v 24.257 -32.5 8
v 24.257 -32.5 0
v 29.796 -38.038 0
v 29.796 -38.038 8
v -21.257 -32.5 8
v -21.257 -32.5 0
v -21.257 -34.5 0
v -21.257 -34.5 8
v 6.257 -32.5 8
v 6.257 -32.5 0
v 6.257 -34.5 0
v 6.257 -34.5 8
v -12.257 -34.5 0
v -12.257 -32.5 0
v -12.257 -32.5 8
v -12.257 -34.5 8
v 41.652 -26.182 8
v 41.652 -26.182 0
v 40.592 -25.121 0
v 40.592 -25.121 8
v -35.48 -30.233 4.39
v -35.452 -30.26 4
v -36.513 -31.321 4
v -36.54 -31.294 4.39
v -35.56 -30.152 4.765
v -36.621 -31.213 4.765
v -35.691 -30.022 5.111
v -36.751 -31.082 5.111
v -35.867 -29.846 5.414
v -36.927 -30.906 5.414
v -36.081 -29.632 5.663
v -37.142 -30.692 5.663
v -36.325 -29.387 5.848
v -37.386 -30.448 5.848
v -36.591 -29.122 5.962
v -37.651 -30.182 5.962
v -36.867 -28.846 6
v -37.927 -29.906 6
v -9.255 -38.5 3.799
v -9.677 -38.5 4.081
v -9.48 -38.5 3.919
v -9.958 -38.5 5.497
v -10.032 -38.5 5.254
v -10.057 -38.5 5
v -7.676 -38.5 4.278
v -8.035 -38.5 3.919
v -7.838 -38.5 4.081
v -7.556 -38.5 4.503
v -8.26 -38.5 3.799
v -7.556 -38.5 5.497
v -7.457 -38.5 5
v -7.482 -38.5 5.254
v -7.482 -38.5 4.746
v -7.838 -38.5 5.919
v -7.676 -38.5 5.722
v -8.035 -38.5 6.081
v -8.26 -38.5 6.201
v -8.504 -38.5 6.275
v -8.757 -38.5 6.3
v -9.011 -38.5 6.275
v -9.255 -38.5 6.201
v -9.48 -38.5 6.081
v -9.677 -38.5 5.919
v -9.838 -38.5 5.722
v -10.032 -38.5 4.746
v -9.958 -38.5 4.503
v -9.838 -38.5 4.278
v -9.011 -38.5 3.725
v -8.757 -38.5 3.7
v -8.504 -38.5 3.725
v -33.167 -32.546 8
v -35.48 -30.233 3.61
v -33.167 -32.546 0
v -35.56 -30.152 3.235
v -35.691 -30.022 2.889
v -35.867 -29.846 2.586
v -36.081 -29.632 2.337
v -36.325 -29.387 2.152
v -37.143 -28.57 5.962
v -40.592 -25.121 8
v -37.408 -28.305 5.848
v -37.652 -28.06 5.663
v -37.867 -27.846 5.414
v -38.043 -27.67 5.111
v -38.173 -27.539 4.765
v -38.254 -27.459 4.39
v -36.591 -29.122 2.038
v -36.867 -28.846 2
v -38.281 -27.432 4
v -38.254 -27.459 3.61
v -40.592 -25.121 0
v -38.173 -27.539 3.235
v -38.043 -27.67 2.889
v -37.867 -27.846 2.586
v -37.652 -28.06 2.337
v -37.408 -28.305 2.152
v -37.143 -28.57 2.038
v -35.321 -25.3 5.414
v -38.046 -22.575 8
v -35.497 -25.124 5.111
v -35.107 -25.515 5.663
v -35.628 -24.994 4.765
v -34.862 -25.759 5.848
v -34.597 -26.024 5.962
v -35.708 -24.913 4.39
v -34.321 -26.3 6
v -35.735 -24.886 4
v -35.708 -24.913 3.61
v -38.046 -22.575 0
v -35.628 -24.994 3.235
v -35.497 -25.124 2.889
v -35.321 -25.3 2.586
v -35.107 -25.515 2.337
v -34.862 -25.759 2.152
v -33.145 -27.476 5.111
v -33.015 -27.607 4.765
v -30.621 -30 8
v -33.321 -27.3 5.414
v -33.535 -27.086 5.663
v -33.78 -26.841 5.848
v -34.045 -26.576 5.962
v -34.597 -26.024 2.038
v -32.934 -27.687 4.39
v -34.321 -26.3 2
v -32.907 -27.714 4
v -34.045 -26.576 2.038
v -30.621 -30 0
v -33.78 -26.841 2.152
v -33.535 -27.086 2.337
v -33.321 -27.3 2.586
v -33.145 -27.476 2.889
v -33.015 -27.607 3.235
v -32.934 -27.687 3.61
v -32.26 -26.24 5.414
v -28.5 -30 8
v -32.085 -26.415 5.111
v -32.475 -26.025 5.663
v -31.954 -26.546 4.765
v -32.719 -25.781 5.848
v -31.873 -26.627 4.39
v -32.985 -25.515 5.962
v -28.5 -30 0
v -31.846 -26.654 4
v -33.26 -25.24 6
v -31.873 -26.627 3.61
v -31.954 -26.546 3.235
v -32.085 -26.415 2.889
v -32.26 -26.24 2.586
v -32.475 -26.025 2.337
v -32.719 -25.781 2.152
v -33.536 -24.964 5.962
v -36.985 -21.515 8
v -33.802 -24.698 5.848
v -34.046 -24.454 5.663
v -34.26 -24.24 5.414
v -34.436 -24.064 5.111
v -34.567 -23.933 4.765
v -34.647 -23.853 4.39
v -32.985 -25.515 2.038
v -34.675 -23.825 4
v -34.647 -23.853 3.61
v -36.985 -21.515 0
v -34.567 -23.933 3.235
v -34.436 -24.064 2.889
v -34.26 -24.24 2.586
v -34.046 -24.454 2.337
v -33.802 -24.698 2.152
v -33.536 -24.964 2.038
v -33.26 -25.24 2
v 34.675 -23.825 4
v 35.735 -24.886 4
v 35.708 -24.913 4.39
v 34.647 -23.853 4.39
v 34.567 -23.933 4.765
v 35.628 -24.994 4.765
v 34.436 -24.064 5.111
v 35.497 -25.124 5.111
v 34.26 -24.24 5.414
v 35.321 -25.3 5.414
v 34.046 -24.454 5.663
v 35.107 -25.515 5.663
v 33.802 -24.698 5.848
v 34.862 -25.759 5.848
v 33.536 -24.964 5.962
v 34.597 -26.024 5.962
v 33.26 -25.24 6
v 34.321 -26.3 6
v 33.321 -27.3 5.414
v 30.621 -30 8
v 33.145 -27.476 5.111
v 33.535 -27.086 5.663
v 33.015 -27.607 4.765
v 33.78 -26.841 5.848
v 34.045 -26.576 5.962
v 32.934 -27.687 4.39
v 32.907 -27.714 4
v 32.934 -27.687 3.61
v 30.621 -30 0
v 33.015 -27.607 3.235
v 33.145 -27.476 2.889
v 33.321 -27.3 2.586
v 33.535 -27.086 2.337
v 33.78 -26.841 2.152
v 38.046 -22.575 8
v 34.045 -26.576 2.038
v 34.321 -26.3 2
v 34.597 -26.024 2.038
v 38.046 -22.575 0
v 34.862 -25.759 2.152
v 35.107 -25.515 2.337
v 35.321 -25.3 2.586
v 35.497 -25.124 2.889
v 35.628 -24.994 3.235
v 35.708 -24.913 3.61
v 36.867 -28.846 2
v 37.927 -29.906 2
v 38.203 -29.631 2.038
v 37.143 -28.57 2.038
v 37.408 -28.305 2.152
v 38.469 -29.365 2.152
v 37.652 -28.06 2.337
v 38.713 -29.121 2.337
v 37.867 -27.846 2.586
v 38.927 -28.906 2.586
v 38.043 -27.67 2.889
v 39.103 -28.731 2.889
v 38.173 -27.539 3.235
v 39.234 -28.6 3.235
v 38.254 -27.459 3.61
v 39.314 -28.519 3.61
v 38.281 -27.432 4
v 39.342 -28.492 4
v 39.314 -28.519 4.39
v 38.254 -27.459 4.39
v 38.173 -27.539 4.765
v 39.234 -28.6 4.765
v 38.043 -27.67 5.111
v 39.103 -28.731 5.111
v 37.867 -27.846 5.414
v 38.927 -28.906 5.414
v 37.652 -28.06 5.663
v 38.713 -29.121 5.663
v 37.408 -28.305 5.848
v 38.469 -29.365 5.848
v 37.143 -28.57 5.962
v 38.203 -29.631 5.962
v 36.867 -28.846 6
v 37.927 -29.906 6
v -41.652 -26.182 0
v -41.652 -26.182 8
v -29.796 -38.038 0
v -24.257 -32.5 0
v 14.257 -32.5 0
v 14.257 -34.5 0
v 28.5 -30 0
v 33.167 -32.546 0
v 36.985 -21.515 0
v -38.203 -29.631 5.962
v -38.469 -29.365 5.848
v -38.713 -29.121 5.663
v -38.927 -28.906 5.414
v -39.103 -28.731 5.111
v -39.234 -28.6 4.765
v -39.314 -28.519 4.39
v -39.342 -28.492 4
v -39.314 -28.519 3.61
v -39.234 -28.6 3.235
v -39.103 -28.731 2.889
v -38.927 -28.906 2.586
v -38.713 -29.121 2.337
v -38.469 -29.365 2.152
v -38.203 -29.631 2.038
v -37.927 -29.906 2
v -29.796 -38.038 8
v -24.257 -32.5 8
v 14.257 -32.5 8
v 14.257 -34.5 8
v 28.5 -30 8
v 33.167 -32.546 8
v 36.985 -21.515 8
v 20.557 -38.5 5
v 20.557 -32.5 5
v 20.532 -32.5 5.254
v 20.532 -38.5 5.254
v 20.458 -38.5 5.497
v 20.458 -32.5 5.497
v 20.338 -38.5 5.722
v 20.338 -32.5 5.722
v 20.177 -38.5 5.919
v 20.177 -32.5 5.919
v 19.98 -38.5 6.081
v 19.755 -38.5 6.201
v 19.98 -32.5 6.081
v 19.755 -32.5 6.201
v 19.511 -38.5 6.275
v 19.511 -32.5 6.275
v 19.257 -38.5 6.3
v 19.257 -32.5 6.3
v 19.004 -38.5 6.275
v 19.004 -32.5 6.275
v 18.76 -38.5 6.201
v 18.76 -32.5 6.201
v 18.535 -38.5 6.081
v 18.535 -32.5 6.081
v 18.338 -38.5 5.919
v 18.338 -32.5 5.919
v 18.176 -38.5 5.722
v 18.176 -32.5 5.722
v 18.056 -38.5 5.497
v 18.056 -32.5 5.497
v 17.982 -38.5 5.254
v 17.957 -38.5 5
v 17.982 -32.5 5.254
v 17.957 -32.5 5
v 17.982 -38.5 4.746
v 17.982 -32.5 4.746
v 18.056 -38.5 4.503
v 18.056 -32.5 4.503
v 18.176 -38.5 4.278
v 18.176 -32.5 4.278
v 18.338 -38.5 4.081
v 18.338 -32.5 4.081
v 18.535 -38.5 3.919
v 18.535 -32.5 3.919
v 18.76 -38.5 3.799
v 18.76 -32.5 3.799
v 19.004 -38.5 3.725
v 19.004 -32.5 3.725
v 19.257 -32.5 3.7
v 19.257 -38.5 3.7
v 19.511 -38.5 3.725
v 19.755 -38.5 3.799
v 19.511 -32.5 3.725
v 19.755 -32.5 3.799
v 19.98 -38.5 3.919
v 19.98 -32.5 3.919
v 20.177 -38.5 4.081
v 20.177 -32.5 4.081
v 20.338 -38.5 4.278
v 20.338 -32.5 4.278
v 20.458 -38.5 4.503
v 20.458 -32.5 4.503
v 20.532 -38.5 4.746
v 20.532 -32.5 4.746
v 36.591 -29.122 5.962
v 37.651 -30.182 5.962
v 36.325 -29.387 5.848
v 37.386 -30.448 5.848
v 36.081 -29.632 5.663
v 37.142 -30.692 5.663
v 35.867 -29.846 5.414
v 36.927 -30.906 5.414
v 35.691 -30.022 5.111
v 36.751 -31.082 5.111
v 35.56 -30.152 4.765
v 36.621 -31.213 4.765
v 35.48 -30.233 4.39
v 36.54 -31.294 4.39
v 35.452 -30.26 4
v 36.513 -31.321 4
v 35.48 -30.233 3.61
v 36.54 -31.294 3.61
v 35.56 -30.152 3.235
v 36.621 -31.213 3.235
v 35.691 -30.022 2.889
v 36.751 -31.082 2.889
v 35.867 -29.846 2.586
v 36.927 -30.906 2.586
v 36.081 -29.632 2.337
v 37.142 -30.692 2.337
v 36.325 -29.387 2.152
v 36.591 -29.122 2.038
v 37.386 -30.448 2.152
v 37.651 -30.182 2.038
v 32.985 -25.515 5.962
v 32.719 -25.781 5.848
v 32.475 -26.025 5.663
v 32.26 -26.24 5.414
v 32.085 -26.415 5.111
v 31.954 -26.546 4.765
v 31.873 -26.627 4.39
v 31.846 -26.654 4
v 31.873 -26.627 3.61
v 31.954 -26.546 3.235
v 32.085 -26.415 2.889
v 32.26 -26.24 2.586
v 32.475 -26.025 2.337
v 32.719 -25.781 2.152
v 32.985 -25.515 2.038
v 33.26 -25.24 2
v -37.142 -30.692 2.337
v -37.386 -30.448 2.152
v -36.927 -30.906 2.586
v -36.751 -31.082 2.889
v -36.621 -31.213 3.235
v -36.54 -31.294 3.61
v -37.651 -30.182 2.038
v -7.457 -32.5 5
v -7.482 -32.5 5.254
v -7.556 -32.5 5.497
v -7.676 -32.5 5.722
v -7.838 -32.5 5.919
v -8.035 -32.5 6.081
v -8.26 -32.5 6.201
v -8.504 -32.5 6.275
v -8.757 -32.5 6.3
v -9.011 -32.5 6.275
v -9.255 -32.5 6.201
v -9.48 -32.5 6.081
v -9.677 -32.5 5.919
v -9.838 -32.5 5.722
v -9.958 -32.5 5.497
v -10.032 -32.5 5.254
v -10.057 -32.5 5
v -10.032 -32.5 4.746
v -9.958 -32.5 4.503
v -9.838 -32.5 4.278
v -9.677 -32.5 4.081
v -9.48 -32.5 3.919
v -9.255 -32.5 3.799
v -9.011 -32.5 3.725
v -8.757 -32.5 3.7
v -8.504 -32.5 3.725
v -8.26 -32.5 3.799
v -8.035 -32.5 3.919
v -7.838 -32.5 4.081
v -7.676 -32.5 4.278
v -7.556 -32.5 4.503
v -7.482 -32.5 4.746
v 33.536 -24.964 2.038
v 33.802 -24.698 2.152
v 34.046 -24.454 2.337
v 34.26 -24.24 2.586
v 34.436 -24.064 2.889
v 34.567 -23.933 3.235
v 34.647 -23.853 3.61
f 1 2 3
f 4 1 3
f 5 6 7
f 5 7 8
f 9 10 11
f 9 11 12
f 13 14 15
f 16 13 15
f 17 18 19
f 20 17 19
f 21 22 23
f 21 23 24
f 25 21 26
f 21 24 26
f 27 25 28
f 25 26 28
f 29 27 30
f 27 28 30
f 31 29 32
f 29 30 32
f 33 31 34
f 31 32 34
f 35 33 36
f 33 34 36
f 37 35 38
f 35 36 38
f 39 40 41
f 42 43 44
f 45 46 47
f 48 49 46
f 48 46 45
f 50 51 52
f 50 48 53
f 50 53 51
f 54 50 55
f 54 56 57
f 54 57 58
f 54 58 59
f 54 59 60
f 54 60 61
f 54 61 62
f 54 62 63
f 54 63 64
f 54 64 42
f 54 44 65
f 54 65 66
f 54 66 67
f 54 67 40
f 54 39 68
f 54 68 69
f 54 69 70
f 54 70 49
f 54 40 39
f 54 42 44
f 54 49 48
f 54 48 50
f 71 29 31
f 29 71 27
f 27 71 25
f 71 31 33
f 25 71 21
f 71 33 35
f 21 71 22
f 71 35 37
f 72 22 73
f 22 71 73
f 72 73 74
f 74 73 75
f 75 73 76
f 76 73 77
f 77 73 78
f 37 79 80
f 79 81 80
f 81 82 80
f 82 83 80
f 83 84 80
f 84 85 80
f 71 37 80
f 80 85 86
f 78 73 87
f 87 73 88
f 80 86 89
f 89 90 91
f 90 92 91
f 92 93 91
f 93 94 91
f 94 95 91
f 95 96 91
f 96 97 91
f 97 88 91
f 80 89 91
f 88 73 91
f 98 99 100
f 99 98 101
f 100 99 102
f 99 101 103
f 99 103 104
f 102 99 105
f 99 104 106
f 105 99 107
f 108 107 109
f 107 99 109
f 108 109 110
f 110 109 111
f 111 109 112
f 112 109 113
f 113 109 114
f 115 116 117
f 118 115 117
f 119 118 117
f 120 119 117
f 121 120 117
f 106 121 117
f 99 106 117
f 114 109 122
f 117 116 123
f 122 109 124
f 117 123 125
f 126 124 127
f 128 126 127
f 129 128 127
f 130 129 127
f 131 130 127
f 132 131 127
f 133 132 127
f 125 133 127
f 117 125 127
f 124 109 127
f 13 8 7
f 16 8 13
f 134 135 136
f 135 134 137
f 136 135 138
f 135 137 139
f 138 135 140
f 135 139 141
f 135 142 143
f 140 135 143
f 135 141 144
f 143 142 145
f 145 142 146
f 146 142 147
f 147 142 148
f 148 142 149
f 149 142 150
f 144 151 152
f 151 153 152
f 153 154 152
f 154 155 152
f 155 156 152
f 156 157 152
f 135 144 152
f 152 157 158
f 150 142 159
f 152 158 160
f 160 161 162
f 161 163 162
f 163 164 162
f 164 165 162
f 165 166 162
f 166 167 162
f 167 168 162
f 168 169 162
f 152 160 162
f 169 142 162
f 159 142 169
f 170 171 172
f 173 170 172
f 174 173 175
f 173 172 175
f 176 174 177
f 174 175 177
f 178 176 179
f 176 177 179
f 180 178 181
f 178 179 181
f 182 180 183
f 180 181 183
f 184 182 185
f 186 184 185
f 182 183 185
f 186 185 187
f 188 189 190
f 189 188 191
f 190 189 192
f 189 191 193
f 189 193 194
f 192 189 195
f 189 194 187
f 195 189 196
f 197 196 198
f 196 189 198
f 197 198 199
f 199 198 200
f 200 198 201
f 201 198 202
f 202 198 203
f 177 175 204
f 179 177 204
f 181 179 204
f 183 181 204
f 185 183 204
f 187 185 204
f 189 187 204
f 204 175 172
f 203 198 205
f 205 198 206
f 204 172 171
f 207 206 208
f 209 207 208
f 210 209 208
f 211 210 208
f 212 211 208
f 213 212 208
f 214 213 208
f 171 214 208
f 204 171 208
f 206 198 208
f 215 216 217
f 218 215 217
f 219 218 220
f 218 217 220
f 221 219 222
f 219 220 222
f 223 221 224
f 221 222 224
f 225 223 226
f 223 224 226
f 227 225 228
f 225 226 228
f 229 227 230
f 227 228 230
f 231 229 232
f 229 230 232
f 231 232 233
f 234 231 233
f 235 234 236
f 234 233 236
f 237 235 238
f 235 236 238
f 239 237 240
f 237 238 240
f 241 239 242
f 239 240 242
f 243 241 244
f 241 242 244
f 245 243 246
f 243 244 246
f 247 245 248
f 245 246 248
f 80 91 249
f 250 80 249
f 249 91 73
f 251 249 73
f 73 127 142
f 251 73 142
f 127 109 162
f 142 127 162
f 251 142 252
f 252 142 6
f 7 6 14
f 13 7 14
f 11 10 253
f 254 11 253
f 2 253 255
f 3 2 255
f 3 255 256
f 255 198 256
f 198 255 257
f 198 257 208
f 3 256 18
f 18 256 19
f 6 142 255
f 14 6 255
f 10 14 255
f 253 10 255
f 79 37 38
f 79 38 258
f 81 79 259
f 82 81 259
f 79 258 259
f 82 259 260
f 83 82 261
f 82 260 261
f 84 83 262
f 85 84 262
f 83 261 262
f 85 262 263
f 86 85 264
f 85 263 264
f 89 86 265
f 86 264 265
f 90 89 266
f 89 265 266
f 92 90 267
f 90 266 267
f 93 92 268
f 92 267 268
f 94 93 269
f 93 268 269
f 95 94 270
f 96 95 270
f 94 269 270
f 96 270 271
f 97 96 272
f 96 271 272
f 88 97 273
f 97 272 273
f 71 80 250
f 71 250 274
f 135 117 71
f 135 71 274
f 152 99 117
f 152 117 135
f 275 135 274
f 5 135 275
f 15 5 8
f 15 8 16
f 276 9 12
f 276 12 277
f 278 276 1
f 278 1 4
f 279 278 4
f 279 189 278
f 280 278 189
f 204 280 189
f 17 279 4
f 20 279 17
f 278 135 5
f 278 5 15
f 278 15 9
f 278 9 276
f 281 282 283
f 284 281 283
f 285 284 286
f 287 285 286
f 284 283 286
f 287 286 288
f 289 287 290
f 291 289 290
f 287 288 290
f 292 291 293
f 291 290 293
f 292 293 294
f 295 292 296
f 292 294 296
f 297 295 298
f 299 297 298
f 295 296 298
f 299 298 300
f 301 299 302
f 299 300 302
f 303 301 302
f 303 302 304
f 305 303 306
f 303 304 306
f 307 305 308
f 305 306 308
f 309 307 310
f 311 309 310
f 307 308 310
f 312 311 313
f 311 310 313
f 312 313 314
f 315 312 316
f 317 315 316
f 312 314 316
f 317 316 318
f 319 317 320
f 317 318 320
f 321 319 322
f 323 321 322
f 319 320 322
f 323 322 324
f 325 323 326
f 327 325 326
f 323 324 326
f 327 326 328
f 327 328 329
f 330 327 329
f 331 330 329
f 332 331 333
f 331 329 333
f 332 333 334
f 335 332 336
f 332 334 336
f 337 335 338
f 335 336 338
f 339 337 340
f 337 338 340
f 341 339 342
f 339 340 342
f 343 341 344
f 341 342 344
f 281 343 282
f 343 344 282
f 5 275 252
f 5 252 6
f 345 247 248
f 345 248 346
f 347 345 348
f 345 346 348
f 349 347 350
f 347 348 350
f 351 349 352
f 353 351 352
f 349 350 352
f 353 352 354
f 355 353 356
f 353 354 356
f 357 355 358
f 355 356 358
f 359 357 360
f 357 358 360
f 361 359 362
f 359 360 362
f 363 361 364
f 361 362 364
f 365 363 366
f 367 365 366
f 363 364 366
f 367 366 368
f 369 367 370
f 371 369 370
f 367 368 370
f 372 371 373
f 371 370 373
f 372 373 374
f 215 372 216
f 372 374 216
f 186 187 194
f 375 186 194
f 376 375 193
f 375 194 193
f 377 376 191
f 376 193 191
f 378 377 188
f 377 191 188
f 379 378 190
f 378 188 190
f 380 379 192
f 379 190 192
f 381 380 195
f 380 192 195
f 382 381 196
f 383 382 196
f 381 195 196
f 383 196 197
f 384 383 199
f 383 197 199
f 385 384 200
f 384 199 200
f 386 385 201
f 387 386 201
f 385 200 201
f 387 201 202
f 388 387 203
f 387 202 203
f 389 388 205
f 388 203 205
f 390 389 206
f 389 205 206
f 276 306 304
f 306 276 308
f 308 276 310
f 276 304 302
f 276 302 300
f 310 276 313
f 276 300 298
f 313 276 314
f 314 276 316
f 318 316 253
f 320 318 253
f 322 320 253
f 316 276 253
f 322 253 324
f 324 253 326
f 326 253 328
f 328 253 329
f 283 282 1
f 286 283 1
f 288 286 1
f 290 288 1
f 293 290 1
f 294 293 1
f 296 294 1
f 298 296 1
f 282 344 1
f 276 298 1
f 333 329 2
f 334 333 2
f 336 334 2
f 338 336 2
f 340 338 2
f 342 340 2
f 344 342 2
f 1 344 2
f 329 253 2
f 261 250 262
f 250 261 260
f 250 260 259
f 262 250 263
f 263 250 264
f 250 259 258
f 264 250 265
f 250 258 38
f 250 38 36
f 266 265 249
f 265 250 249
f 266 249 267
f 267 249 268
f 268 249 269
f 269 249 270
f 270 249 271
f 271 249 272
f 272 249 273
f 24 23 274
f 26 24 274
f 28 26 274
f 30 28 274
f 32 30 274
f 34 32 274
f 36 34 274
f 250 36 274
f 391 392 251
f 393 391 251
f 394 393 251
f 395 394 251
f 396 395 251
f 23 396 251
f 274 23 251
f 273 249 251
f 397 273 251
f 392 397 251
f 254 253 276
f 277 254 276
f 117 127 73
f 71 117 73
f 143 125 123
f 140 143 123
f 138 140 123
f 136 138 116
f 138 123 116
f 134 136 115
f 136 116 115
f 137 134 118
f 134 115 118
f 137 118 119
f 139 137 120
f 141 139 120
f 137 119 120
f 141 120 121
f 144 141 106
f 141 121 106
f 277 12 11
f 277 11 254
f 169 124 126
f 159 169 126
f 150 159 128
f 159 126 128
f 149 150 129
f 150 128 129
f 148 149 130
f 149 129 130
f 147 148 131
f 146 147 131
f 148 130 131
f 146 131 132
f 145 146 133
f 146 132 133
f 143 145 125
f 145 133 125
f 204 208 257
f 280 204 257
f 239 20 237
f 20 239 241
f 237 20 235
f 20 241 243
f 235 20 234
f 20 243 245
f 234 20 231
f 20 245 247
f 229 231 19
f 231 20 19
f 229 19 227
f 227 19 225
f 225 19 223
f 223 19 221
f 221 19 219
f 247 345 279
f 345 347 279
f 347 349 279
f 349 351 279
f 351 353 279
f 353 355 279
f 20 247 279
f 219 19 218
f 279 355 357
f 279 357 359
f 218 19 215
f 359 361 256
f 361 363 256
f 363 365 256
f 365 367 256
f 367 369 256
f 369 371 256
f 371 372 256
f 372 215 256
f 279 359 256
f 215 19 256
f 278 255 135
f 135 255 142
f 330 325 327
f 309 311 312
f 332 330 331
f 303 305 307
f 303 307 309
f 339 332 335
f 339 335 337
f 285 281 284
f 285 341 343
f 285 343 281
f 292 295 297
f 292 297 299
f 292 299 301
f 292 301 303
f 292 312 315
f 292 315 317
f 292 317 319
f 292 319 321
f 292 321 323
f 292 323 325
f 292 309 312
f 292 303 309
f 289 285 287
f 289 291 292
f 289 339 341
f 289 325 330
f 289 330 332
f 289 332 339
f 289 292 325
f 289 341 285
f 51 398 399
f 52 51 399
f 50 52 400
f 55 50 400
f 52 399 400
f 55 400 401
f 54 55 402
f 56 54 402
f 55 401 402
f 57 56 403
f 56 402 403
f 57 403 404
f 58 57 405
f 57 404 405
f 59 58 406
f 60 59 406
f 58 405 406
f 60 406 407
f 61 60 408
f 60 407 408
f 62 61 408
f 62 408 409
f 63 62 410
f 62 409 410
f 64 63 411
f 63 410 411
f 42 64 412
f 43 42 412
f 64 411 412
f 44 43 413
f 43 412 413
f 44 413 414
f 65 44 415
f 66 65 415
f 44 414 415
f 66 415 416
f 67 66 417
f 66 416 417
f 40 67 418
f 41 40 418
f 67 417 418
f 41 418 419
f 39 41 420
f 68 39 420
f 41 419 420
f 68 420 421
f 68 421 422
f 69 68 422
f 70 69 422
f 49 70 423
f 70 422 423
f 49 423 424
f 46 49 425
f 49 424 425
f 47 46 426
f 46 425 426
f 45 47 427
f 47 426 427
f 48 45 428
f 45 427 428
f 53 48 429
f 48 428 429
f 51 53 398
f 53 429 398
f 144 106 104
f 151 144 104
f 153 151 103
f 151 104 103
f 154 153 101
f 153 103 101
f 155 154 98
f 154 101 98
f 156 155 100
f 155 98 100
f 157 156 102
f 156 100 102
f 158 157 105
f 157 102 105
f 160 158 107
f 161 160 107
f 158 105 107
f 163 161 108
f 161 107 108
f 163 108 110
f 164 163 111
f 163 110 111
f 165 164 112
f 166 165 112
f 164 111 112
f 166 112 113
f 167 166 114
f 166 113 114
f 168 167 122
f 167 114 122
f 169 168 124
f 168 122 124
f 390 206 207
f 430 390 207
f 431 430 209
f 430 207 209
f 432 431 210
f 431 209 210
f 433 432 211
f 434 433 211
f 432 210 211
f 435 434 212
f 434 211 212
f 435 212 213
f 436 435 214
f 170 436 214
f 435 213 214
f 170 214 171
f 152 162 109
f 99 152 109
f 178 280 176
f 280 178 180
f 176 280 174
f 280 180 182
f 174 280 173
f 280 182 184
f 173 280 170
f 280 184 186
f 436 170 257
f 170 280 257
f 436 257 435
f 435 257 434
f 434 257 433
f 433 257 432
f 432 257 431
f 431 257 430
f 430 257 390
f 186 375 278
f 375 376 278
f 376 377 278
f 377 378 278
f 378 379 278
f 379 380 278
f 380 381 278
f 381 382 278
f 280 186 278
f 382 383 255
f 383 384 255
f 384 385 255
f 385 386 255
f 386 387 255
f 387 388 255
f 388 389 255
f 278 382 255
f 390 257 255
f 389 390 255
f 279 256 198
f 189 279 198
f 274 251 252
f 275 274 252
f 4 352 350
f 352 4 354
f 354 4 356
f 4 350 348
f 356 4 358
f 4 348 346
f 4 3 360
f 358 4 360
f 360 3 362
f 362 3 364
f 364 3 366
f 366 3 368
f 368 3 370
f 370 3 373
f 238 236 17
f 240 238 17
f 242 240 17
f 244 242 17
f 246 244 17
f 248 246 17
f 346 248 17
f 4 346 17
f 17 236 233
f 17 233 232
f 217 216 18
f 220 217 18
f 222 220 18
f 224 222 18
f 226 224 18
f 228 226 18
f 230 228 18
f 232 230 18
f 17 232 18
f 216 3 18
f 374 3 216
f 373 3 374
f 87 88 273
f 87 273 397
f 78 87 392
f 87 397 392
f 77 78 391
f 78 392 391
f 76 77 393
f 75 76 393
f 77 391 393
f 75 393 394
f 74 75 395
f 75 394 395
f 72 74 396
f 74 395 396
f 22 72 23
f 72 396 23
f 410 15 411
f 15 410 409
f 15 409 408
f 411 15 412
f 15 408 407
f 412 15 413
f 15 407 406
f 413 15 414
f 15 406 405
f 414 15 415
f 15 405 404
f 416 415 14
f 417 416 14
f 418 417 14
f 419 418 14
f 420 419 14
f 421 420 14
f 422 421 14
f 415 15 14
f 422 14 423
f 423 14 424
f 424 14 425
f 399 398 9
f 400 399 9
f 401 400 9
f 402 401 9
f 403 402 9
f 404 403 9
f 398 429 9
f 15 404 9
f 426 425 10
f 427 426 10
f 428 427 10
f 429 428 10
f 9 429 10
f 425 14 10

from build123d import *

# Parameters (mm, degrees)
F1_DEPTH = 8
F3_DEPTH = 10
F5_DEPTH = 9.9
F6_W     = 9
F6_H     = 8
F6_W_2   = 8
F7_DEPTH = 2
F6_R     = 1.3
F8_DEPTH = 6


with BuildPart() as f1:
    # F0 (on Top) → F1 (new body)
    with BuildSketch(Plane.XY):
        Polygon((28.5, -30), (-28.5, -30), (-36.985281, -21.514719), (-38.045942, -22.575379), (-30.62132, -30), (-33.166905, -32.545584), (-40.591526, -25.120963), (-41.652186, -26.181623), (-29.795584, -38.038225), (-24.257359, -32.5), (24.257359, -32.5), (29.795584, -38.038225), (41.652186, -26.181623), (40.591526, -25.120963), (33.166905, -32.545584), (30.62132, -30), (38.045942, -22.575379), (36.985281, -21.514719), align=None)
    extrude(amount=F1_DEPTH)

    # F2 (on face) → F3 (cut)
    with BuildSketch(Plane(origin=(33.916905, -33.916905, 0), x_dir=(0.707107, 0.707107, 0), z_dir=(0.707107, -0.707107, 0))):
        with BuildLine():
            ThreePointArc((7.671573, 4), (7.085786, 5.414214), (5.671573, 6))
            ThreePointArc((5.671573, 6), (3.671573, 4), (5.671573, 2))
            ThreePointArc((5.671573, 2), (7.085786, 2.585786), (7.671573, 4))
        make_face()
    extrude(amount=-F3_DEPTH, mode=Mode.SUBTRACT)

    # F4 (on face) → F5 (cut)
    with BuildSketch(Plane(origin=(-33.916905, -33.916905, 0), x_dir=(0.707107, -0.707107, 0), z_dir=(-0.707107, -0.707107, 0))):
        with BuildLine():
            ThreePointArc((-3.671573, 4), (-4.257359, 5.414214), (-5.671573, 6))
            ThreePointArc((-5.671573, 6), (-7.671573, 4), (-5.671573, 2))
            ThreePointArc((-5.671573, 2), (-4.257359, 2.585786), (-3.671573, 4))
        make_face()
    extrude(amount=-F5_DEPTH, mode=Mode.SUBTRACT)

    # F6 (on face) → F7 (join)
    with BuildSketch(Plane.XZ.offset(32.5)):
        with Locations((-16.757359, 4)):
            Rectangle(F6_W, F6_H)
        with Locations((10.257359, 4)):
            Rectangle(F6_W_2, F6_H)
    extrude(amount=F7_DEPTH)

    # F6 (on face) → F8 (join)
    with BuildSketch(Plane.XZ.offset(32.5)):
        with Locations((-8.757359, 5)):
            Circle(F6_R)
        with Locations((19.257359, 5)):
            Circle(F6_R)
    extrude(amount=F8_DEPTH)


solid = f1.part
